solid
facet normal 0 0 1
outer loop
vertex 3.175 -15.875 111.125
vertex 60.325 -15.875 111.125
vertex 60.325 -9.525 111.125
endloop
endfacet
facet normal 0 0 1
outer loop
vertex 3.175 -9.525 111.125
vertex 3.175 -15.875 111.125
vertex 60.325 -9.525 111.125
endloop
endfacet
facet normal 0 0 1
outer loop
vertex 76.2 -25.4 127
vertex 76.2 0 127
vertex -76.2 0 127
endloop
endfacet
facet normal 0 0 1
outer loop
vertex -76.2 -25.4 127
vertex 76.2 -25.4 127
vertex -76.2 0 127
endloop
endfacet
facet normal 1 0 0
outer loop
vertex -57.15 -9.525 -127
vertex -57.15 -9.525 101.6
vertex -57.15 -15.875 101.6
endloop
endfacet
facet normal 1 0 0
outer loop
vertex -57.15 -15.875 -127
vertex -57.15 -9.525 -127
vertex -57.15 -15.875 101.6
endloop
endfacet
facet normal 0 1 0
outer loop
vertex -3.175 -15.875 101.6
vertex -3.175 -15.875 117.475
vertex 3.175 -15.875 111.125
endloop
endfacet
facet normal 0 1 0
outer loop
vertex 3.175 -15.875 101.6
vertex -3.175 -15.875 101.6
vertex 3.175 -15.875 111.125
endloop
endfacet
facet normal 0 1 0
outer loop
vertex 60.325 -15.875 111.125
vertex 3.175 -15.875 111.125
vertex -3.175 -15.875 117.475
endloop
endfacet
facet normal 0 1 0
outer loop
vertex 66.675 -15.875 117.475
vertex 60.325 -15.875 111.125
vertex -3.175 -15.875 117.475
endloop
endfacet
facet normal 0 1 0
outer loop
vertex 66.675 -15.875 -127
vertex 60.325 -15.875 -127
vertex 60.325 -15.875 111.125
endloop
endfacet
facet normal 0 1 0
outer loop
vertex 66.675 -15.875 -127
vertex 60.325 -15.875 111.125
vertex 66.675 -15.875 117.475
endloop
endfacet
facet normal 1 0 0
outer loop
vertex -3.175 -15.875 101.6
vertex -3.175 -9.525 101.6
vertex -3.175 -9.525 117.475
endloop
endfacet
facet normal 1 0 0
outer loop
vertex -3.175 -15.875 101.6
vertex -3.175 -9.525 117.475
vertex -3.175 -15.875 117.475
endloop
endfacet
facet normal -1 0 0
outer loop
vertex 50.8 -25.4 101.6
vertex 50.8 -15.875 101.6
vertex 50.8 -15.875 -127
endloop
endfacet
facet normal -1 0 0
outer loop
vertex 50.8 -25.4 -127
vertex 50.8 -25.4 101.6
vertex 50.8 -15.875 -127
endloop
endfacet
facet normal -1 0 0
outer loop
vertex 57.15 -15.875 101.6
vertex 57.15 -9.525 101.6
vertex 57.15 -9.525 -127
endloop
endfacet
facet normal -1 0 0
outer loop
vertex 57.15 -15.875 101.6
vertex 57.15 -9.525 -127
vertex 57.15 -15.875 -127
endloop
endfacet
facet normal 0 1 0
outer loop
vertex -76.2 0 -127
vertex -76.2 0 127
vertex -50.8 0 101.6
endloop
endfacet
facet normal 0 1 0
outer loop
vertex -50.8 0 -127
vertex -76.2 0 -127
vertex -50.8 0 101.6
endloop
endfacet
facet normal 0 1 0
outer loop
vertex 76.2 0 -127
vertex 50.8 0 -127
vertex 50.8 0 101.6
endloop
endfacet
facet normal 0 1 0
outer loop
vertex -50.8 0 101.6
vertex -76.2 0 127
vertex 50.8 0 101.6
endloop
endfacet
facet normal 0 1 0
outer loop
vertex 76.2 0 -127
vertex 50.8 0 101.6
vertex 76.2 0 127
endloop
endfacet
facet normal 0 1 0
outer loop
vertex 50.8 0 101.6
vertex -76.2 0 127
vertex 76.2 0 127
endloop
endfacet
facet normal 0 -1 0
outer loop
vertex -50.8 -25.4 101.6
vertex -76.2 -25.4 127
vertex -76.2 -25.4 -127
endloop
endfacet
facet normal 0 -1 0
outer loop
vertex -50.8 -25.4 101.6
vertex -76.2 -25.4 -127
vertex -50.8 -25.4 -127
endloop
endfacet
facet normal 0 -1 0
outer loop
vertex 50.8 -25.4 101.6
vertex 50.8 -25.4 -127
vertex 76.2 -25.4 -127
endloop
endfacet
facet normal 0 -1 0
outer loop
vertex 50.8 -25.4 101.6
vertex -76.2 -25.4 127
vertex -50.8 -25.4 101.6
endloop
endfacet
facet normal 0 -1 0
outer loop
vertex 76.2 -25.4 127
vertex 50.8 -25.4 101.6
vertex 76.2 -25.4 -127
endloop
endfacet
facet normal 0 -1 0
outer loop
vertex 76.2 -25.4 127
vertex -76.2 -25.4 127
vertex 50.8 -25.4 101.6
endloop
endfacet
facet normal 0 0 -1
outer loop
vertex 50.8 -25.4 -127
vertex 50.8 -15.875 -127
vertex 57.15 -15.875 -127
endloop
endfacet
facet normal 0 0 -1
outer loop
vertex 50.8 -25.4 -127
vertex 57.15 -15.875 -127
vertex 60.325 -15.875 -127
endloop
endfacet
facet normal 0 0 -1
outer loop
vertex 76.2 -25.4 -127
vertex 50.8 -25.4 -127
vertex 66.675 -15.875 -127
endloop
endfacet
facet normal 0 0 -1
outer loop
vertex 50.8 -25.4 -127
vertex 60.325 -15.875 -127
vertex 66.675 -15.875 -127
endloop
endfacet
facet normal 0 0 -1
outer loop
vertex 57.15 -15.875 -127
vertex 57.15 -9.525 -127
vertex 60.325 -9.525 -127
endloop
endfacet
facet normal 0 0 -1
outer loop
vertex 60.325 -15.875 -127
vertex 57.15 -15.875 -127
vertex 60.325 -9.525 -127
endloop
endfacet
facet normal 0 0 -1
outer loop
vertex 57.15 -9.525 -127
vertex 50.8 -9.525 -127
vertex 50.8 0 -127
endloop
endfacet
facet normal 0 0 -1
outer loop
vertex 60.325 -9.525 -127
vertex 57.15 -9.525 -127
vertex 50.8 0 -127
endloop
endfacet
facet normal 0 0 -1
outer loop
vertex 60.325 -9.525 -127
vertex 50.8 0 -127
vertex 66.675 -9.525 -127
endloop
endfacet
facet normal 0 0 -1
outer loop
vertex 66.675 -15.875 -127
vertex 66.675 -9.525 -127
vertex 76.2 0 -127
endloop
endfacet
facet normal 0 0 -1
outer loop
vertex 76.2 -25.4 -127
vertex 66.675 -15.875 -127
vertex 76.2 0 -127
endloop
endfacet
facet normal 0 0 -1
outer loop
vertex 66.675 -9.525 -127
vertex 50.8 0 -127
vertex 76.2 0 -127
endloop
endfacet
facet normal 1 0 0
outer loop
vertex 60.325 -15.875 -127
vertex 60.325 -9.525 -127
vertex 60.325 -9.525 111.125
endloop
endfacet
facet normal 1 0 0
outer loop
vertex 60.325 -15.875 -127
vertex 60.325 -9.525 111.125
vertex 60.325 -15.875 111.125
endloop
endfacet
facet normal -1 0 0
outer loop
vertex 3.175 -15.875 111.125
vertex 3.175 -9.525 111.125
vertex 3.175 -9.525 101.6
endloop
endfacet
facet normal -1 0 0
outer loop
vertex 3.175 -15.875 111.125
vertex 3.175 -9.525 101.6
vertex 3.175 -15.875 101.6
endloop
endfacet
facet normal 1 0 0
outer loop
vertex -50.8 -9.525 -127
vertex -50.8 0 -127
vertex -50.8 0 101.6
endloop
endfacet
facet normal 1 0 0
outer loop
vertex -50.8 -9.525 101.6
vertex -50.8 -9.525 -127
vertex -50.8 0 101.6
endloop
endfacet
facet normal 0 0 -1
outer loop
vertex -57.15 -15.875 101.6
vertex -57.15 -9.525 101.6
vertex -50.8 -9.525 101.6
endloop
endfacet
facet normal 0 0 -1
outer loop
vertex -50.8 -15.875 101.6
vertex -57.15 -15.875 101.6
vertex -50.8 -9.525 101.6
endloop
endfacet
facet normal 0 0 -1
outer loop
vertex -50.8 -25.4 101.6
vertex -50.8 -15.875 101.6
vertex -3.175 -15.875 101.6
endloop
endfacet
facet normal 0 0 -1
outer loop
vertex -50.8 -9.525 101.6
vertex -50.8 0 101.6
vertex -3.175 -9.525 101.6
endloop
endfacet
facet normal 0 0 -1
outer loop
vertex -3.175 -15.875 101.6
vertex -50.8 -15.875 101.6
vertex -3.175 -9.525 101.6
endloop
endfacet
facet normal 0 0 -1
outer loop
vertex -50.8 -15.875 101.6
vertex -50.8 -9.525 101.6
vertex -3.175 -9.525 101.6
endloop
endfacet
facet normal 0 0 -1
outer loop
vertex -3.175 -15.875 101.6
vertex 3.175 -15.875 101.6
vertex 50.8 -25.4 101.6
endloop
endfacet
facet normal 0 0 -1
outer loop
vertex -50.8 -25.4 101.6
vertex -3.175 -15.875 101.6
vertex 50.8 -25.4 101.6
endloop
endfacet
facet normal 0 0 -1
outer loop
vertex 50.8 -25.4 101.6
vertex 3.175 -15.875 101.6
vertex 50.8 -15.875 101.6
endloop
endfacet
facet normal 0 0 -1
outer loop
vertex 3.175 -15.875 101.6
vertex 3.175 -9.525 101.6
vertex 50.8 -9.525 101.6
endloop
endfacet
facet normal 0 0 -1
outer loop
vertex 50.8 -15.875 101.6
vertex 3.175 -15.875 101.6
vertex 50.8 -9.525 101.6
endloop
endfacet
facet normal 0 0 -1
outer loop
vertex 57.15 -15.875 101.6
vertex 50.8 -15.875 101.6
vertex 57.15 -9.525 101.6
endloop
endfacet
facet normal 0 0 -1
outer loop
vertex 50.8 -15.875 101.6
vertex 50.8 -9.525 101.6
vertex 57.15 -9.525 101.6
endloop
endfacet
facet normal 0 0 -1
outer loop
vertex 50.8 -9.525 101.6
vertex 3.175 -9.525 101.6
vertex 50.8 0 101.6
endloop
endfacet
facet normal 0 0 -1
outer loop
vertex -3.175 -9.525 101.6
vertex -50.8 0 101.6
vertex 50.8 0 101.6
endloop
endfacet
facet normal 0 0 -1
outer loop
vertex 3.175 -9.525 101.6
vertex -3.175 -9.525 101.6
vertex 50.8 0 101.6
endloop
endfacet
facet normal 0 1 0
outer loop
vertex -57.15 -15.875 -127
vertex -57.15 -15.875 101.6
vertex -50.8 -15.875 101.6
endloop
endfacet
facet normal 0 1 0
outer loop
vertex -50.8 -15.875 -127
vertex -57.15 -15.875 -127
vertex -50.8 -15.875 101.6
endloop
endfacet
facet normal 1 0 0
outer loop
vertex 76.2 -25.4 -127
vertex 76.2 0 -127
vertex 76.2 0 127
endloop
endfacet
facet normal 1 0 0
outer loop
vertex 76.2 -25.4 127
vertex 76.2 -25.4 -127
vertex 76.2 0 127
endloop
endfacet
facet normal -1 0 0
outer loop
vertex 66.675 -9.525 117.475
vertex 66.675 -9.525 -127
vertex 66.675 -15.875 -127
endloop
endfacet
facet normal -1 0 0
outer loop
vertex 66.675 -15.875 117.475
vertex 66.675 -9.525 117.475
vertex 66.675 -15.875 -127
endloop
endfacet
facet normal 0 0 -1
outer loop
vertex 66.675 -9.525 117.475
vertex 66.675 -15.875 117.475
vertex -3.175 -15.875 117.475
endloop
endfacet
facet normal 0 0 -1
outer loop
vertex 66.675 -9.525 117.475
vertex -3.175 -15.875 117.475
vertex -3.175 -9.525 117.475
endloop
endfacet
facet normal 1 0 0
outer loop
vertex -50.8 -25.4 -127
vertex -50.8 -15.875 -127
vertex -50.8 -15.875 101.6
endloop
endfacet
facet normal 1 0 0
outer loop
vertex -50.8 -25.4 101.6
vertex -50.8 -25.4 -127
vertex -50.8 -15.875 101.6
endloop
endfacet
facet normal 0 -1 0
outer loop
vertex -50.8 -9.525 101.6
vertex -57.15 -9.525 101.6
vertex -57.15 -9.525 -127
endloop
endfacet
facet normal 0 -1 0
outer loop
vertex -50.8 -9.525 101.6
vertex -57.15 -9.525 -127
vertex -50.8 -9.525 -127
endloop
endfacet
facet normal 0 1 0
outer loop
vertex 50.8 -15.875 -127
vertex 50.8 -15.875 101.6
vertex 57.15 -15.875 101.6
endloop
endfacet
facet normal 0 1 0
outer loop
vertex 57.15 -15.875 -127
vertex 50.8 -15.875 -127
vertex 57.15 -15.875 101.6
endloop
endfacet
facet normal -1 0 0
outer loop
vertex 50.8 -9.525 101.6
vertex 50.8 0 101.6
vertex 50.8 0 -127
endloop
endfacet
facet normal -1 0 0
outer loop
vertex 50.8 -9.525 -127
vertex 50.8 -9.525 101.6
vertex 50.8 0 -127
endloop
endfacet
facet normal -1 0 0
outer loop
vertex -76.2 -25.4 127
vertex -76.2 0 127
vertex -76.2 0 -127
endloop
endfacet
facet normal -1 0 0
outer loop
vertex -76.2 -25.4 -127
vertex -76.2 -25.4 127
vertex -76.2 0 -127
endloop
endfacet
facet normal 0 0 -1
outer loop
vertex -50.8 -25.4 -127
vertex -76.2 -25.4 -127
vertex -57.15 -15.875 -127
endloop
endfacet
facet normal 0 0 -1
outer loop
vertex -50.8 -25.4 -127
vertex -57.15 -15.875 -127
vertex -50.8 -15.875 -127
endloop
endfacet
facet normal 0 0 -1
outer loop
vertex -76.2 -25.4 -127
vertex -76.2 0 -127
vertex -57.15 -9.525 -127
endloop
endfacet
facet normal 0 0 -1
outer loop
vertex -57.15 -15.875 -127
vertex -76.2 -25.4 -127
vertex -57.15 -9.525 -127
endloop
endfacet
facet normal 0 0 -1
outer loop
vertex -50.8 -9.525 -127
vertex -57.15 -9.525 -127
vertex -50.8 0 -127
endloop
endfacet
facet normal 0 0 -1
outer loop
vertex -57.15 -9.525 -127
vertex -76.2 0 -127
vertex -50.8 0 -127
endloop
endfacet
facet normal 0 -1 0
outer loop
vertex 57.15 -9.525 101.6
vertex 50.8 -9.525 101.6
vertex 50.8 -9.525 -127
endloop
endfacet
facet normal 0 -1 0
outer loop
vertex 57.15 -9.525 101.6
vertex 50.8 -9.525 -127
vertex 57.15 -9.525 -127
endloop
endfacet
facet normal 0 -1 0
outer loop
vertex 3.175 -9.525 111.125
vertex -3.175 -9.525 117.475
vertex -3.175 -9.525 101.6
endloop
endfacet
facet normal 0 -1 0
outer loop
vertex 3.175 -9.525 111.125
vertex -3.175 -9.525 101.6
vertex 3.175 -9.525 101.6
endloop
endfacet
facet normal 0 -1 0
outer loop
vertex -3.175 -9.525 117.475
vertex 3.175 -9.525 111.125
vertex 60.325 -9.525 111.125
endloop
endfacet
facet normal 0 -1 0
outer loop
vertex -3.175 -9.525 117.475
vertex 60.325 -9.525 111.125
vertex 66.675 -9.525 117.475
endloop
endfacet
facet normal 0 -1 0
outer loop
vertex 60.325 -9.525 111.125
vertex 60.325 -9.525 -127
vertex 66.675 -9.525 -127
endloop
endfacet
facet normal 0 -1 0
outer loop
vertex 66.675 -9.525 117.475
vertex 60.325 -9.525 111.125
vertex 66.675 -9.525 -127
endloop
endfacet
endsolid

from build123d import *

# Parameters (mm, degrees)
F1_DEPTH  = 25.4
F3_W      = 6.35
F3_H      = 6.35
F4_W      = 6.35
F4_H      = 6.35
F5_DEPTH  = 228.6
F2_W      = 6.35
F2_H      = 6.35
F6_DEPTH  = 9.525
F8_START  = -9.525
F7_W      = 6.35
F7_H      = 6.35
F8_DEPTH  = 69.85
F9_W      = 6.35
F9_H      = 6.35
F10_DEPTH = 238.125


with BuildPart() as f1:
    # F0 (on Front) → F1 (new body)
    with BuildSketch(Plane.XZ):
        Polygon((76.2, -127), (76.2, 127), (-76.2, 127), (-76.2, -127), (-50.8, -127), (-50.8, -101.6), (-50.8, 101.6), (50.8, 101.6), (50.8, -101.6), (50.8, -127), align=None)
    extrude(amount=F1_DEPTH)

    # F3 (on face) + F4 (on face) → F5 (cut)
    with BuildSketch(Plane(origin=(0, 0, -127), x_dir=(1, 0, 0), z_dir=(0, 0, -1))):
        with Locations((-53.975, 12.7)):
            Rectangle(F3_W, F3_H)
    with BuildSketch(Plane(origin=(0, 0, -127), x_dir=(1, 0, 0), z_dir=(0, 0, -1))):
        with Locations((53.975, 12.7)):
            Rectangle(F4_W, F4_H)
    extrude(amount=-F5_DEPTH, mode=Mode.SUBTRACT)

    # F2 (on face) → F6 (cut)
    with BuildSketch(Plane(origin=(0, 0, 101.6), x_dir=(1, 0, 0), z_dir=(0, 0, -1))):
        with Locations((0, 12.7)):
            Rectangle(F2_W, F2_H)
    extrude(amount=-F6_DEPTH, mode=Mode.SUBTRACT)

    # F7 (on face) → F8 (cut)
    with BuildSketch(Plane.YZ.offset(76.2).offset(F8_START)):
        with Locations((-12.7, 114.3)):
            Rectangle(F7_W, F7_H)
    extrude(amount=-F8_DEPTH, mode=Mode.SUBTRACT)

    # F9 (on face) → F10 (cut)
    with BuildSketch(Plane(origin=(0, 0, -127), x_dir=(1, 0, 0), z_dir=(0, 0, -1))):
        with Locations((63.5, 12.7)):
            Rectangle(F9_W, F9_H)
    extrude(amount=-F10_DEPTH, mode=Mode.SUBTRACT)


solid = f1.part
